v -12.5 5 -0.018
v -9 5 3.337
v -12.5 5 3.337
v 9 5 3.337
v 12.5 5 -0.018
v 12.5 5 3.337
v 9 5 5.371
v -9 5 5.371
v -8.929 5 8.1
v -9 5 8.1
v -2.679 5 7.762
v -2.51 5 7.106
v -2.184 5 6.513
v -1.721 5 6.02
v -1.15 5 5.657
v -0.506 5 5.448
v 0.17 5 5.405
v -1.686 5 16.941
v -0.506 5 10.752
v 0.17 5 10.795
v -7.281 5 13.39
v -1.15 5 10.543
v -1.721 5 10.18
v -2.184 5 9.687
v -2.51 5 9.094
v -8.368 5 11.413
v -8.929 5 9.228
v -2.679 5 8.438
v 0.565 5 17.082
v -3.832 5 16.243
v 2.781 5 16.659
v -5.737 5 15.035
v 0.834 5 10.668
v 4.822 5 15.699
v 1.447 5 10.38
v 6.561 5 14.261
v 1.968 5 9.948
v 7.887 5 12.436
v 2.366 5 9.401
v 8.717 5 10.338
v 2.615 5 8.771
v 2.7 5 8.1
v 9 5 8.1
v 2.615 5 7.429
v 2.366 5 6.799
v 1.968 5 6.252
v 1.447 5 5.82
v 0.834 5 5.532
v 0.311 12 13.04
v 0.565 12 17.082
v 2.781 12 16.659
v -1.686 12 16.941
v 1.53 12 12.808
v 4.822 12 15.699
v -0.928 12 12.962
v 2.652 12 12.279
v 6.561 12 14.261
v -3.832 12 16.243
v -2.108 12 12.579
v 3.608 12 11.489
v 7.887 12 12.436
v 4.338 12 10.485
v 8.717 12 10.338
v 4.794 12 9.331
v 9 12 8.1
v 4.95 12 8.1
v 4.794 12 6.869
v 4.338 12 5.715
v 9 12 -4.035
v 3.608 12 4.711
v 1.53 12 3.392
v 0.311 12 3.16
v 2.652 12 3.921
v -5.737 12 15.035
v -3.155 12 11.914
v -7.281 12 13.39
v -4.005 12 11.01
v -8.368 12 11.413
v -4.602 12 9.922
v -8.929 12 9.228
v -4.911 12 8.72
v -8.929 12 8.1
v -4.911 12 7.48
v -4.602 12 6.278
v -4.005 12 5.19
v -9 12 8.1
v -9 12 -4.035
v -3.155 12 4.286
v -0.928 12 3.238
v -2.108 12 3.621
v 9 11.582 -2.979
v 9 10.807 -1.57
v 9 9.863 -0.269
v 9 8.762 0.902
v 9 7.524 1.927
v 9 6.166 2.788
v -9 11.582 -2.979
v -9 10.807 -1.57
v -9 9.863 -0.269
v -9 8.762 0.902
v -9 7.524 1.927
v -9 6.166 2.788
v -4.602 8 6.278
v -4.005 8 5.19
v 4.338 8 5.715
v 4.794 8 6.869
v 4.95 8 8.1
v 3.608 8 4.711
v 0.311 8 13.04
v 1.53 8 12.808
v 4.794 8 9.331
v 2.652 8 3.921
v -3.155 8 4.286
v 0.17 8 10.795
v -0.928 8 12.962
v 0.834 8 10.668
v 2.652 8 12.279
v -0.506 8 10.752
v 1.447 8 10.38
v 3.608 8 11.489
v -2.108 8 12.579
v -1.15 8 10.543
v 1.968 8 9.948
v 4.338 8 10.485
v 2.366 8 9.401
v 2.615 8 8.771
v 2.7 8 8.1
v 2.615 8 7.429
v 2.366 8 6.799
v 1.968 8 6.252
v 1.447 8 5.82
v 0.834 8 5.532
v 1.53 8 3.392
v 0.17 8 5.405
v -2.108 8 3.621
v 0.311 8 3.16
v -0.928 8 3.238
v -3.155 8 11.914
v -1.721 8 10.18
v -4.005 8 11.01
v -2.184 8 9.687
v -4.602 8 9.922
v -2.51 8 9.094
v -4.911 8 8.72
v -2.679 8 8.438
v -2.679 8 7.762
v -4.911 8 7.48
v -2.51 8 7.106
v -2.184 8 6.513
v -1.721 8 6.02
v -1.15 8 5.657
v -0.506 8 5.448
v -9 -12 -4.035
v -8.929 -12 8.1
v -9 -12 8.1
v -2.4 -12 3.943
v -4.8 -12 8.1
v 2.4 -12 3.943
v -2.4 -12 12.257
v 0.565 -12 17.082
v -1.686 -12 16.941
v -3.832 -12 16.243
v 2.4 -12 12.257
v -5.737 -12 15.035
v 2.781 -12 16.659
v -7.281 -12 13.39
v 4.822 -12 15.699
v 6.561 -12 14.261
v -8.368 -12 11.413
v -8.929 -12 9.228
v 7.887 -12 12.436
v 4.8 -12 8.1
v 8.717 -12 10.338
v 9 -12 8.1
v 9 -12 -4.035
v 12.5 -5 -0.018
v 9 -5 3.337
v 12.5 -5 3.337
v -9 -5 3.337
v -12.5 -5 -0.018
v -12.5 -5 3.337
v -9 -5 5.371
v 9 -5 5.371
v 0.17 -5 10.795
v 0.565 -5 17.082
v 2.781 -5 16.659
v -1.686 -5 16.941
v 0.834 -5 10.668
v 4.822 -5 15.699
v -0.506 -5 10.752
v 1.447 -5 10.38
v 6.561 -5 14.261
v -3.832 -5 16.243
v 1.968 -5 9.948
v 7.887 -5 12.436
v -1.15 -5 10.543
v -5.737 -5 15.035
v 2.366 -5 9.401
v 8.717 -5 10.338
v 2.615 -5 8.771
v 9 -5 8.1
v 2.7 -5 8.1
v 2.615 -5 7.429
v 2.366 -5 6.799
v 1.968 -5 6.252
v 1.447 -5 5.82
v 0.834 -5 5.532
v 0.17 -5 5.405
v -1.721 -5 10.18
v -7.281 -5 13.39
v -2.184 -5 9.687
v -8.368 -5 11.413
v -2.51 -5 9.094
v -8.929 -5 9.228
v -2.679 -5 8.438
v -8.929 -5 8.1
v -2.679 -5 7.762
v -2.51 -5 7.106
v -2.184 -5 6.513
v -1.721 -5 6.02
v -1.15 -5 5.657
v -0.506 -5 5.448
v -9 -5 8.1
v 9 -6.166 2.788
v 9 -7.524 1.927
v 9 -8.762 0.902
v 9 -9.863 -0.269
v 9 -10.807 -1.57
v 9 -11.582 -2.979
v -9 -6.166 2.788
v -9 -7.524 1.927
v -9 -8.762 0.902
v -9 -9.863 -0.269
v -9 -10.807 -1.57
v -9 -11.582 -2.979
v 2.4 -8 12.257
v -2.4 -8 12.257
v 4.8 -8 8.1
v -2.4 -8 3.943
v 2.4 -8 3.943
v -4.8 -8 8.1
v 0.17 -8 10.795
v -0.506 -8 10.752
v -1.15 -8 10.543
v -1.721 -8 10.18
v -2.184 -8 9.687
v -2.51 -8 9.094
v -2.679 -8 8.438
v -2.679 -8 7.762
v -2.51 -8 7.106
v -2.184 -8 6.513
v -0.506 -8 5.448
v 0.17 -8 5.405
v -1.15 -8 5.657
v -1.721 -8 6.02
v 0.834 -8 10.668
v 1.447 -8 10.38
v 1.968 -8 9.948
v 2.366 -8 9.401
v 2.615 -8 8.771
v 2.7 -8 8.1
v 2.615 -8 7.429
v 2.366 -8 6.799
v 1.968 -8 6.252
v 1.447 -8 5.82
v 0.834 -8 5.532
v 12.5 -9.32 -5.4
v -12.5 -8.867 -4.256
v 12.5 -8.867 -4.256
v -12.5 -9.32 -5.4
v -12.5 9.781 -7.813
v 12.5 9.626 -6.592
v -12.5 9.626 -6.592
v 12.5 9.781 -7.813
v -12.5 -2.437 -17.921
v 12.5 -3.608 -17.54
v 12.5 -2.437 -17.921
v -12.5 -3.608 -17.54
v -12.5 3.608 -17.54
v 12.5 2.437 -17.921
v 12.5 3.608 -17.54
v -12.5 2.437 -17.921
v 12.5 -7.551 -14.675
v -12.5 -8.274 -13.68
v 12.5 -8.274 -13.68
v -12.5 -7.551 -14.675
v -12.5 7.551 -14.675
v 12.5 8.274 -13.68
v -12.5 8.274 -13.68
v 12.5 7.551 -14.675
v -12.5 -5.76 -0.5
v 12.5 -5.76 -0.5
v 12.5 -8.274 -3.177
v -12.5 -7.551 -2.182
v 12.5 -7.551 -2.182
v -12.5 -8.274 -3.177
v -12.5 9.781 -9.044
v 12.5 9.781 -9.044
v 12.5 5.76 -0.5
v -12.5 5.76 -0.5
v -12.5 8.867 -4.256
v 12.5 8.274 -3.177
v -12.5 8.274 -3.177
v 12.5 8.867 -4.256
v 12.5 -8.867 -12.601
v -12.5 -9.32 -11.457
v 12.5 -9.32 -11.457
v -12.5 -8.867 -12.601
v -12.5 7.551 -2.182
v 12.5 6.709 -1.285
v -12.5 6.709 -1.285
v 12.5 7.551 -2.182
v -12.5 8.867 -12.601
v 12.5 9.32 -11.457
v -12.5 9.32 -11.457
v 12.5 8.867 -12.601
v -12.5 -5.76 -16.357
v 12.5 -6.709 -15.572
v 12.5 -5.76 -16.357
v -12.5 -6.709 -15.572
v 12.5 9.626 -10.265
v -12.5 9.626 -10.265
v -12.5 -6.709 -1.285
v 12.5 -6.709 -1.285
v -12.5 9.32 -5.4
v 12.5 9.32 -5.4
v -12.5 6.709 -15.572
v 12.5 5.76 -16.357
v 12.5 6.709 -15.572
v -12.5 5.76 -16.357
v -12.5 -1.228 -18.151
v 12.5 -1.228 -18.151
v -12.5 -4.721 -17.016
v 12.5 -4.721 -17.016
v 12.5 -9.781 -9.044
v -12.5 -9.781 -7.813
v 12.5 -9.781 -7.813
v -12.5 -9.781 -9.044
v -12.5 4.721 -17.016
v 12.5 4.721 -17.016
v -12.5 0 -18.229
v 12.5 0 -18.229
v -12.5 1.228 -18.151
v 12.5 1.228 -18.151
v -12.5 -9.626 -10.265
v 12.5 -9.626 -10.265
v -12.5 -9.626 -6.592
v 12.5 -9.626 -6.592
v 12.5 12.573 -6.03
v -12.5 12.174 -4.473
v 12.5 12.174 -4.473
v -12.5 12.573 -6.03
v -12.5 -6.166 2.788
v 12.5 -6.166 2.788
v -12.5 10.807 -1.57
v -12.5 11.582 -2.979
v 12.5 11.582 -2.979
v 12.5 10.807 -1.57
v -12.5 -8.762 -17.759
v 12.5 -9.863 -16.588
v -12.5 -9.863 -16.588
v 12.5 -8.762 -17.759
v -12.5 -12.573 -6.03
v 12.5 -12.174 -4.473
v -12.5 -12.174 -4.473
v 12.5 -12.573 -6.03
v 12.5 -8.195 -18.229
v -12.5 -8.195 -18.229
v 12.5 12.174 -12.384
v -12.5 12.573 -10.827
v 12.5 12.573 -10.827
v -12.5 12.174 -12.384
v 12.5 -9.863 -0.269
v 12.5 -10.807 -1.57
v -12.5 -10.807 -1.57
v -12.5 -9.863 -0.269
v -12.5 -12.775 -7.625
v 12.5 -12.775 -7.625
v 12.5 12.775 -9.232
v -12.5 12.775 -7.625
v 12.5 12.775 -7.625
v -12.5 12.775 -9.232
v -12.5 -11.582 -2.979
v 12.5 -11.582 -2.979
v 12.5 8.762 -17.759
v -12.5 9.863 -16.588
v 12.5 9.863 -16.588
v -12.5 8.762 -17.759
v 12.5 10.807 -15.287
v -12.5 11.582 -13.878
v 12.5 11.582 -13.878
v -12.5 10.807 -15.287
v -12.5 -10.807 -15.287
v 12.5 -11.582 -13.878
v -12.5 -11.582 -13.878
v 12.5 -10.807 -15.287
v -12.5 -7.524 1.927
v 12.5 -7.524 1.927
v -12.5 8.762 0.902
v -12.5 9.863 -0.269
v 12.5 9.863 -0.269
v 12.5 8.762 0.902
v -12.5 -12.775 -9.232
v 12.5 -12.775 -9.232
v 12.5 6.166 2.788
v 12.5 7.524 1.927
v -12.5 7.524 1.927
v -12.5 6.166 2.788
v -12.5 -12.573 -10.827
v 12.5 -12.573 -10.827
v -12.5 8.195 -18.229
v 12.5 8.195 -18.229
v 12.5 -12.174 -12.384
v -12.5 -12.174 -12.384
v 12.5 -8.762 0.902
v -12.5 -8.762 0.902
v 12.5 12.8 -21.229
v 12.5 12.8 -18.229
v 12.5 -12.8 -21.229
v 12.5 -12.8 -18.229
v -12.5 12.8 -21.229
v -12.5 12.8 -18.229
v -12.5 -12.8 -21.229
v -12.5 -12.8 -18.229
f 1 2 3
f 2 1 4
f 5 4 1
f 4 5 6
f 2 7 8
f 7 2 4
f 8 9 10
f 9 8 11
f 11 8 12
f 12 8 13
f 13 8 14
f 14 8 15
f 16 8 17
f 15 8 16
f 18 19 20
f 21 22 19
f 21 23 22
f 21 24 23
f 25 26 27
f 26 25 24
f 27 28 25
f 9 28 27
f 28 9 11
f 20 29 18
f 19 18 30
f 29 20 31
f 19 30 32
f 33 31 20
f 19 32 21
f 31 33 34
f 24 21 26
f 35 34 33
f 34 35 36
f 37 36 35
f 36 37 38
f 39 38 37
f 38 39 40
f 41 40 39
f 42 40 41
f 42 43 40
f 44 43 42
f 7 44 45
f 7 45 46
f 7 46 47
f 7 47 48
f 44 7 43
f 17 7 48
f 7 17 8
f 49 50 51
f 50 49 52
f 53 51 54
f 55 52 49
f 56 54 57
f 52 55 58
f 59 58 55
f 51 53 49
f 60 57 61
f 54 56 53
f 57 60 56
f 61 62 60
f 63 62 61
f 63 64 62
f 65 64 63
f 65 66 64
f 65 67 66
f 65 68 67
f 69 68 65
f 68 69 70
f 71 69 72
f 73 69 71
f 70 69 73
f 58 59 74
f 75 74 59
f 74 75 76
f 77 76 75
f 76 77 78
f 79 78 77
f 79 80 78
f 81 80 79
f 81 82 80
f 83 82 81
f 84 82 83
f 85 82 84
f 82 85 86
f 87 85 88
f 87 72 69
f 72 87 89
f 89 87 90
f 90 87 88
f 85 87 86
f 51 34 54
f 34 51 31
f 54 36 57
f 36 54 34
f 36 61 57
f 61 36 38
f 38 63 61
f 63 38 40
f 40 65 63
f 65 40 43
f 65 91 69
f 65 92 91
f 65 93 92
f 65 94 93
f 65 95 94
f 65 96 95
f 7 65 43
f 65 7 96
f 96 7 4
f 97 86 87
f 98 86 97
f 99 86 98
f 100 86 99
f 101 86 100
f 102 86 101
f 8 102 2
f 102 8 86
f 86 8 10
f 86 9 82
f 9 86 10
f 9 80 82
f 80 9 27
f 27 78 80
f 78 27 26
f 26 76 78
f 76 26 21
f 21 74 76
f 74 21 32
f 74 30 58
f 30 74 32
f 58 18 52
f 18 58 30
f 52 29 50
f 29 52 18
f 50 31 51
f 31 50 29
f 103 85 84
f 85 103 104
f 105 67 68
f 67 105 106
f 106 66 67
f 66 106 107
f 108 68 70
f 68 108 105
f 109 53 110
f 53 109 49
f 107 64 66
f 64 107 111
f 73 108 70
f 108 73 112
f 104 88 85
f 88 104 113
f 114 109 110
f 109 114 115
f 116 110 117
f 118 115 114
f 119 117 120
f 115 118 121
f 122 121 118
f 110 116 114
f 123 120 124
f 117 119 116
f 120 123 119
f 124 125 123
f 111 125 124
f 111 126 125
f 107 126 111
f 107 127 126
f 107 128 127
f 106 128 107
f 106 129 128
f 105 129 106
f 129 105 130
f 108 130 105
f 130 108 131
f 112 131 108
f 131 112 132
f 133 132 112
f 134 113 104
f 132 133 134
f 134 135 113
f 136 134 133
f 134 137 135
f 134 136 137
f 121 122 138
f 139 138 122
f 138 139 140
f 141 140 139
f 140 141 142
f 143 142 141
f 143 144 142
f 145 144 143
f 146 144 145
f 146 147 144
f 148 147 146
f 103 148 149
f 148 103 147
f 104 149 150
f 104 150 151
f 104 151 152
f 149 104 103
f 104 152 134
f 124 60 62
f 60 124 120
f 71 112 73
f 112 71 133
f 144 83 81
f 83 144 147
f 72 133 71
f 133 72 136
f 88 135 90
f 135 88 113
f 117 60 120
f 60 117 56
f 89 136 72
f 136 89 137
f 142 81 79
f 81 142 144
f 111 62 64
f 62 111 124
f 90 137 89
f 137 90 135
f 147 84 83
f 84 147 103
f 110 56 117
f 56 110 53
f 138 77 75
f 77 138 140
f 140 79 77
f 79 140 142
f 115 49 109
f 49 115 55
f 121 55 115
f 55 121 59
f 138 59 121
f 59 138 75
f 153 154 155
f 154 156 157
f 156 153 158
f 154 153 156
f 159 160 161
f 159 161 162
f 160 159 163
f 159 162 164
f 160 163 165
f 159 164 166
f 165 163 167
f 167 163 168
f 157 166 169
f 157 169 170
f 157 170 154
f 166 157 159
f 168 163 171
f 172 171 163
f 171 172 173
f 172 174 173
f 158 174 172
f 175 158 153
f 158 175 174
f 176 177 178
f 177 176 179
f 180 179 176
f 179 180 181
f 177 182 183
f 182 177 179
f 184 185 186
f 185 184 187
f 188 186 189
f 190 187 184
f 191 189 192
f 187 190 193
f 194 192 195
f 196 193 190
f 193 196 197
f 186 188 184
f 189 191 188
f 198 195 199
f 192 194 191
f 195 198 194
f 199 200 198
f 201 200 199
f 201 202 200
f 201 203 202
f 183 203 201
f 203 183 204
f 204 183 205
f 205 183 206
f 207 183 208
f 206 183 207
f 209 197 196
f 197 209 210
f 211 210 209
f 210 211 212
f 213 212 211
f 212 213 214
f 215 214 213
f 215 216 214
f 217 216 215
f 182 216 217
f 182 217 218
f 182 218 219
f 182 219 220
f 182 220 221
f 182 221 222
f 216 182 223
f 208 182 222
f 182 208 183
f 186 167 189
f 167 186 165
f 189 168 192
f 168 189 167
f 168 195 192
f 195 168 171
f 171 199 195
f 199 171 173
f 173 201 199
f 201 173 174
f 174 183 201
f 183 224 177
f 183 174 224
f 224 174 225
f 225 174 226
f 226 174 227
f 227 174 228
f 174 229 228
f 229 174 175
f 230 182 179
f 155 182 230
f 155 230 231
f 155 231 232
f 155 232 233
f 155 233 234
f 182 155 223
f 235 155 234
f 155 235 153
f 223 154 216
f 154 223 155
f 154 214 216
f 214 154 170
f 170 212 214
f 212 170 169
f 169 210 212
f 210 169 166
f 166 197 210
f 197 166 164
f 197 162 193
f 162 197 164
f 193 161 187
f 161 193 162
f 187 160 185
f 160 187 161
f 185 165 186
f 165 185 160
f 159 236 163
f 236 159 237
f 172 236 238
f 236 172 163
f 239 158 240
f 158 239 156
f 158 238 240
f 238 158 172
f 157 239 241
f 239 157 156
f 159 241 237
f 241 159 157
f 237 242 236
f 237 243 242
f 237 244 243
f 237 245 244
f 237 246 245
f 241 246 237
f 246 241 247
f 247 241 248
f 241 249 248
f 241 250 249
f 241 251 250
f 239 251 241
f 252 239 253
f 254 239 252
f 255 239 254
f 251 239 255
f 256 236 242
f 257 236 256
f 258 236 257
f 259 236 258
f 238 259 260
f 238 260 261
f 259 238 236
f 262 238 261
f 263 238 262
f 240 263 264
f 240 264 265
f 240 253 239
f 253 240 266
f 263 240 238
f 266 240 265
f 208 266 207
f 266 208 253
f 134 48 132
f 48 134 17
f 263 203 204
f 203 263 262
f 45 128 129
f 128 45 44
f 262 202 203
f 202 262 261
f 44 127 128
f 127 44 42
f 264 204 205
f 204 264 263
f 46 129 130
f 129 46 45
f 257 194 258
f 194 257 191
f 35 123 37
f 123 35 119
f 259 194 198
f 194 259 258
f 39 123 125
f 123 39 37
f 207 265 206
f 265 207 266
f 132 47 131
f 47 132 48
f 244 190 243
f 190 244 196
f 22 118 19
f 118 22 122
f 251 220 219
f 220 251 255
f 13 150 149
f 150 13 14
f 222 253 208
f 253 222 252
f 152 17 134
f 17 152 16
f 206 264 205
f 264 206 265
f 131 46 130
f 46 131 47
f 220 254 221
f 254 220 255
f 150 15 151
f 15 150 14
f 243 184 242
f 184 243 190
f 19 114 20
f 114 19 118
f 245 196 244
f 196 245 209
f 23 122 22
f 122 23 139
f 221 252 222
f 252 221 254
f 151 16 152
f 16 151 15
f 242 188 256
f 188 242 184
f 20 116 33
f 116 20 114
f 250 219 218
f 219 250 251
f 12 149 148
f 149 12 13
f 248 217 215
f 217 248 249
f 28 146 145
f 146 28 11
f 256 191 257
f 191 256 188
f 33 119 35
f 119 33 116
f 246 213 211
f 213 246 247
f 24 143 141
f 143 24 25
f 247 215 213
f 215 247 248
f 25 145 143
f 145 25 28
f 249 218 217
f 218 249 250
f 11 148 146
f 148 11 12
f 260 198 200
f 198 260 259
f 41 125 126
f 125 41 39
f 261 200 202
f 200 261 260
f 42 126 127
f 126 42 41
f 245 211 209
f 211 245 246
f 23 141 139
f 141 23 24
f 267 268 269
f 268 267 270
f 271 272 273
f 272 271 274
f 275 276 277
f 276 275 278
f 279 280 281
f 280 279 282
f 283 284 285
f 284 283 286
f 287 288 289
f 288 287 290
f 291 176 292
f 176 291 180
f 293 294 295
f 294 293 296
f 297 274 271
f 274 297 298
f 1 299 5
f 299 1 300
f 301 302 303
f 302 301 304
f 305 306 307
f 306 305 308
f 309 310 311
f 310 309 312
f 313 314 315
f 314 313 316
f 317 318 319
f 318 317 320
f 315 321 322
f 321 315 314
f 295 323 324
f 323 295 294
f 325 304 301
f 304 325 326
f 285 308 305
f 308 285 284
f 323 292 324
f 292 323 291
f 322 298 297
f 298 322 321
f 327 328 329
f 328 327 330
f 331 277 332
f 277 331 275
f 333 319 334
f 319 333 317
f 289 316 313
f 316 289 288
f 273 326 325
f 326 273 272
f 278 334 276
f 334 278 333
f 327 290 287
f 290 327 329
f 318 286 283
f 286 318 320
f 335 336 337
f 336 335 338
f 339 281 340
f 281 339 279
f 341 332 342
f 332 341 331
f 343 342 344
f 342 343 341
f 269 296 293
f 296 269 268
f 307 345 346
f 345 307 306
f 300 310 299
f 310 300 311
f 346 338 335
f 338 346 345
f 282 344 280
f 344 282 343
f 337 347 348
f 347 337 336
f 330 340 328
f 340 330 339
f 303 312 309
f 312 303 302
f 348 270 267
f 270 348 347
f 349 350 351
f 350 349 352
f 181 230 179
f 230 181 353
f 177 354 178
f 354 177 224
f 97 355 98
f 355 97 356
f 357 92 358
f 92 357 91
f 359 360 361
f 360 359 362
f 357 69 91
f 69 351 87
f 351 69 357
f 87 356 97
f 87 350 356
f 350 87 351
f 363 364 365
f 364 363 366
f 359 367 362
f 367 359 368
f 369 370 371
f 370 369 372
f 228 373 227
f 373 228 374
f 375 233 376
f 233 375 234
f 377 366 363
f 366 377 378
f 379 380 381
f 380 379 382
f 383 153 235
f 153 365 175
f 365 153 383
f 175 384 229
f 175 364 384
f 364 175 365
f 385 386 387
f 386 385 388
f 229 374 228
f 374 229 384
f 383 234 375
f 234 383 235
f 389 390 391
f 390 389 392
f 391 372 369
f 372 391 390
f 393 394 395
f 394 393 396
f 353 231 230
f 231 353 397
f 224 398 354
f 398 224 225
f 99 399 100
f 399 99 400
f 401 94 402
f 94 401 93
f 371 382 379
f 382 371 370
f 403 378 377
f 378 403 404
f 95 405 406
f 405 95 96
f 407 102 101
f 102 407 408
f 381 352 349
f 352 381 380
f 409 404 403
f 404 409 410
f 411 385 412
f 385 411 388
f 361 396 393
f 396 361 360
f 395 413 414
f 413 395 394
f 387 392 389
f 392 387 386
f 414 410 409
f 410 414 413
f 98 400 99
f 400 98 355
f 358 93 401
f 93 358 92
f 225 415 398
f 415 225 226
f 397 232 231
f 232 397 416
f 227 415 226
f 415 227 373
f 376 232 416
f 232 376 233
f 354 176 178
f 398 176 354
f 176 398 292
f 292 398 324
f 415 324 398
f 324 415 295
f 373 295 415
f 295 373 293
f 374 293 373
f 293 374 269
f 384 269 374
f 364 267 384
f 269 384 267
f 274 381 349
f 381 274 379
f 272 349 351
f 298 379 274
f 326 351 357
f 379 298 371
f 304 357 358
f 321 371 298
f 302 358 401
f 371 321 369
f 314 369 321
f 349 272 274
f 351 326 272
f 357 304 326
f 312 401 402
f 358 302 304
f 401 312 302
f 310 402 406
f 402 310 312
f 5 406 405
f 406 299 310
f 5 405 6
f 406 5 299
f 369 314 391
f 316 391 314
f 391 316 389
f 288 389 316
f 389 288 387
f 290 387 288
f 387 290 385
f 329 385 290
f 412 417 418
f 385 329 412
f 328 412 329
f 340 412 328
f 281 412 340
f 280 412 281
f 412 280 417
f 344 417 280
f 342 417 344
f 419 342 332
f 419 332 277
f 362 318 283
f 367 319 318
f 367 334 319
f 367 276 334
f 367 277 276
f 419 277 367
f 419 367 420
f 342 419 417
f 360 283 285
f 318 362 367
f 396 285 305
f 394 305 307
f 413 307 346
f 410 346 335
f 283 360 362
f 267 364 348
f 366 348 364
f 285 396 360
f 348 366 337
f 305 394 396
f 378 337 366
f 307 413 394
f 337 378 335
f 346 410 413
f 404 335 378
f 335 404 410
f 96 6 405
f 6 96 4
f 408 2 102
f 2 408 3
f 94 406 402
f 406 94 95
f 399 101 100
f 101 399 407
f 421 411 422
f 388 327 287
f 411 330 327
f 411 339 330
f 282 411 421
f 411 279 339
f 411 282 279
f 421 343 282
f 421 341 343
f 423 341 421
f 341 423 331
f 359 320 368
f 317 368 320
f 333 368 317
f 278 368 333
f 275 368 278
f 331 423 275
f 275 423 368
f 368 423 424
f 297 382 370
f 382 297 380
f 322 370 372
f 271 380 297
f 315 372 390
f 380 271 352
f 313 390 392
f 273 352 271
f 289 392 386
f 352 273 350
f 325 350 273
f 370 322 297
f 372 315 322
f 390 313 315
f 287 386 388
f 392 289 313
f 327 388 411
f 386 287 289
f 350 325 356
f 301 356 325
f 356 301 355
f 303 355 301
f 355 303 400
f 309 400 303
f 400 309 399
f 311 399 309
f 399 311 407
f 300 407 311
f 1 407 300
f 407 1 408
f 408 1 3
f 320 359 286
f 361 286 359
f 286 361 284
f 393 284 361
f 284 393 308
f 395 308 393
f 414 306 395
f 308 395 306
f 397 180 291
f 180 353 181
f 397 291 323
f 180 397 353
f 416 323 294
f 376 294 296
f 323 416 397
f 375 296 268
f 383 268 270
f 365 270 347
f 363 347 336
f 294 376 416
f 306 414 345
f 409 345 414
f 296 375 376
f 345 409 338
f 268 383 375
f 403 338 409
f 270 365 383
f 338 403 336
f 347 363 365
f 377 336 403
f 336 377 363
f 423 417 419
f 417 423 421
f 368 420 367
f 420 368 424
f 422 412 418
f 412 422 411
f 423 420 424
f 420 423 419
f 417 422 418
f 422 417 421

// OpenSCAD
// file: rj260_linear_bearing.scad
// Copyright 2017 Pavel Penev
// https://www.thingiverse.com/pavpen/about
//
// You can use this file under Attribution-ShareAlike 4.0 International
// (CC BY-SA 4.0).
//
// If you need to use it under another license, send me a message.

// Parameters for J260 Igus linear bearings
// <http://www.igus.com/wpck/3660/drylin_r_rj260um_02>:
outer_r = 19.2 / 2 + 0.2;
inner_r = 12.15 / 2;

// Length of the part actually intended to contact the axle:
sleeve_length = 25 - 0.2;
chamfer_length = 1.5;

// Total length of the bearing:
length = sleeve_length + 2 * chamfer_length;

outer_chamfer_angle = 15;
inner_chamfer_angle = 15;

fn = 100;


// Export functions:
function pro_pavpen_rj260_linear_bearing_outer_r() = outer_r;
function pro_pavpen_rj260_linear_bearing_inner_r() = inner_r;
function pro_pavpen_rj260_linear_bearing_sleeve_length() = sleeve_length;
function pro_pavpen_rj260_linear_bearing_length() = length;

// Demo:
pro_pavpen_rj260_linear_bearing();


module pro_pavpen_rj260_linear_bearing()
{
    difference()
    {
        union()
        {
            translate([0, 0, chamfer_length])
            cylinder(r = outer_r, h = sleeve_length, $fn = fn);
            
            // Top outer chamfer:
            translate([0, 0, chamfer_length + sleeve_length])
            cylinder(
                r1 = outer_r,
                r2 = outer_r - chamfer_length * tan(outer_chamfer_angle),
                h = chamfer_length,
                $fn = fn);
            
            // Bottom outer chamfer:
            cylinder(
                r1 = outer_r - chamfer_length * tan(outer_chamfer_angle),
                r2 = outer_r,
                h = chamfer_length,
                $fn = fn);
        }
        
        translate([0, 0, -1])
        cylinder(r = inner_r, h = length + 2, $fn = fn);
        
        // Top inner chamfer:
        translate([0, 0, chamfer_length + sleeve_length])
        cylinder(
            r1 = inner_r,
            r2 = inner_r + (chamfer_length + 1) * tan(inner_chamfer_angle),
            h = chamfer_length + 1,
            $fn = fn);
        
        // Bottom inner chamfer:
        translate([0, 0, -1])
        cylinder(
            r1 = inner_r + (chamfer_length + 1) * tan(inner_chamfer_angle),
            r2 = inner_r,
            h = chamfer_length + 1,
            $fn = fn);
    }
}
// main file
// Copyright 2017 Pavel Penev
// https://www.thingiverse.com/pavpen/about
//
// You can use this file under Attribution-ShareAlike 4.0 International
// (CC BY-SA 4.0).
//
// If you need to use it under another license, send me a message.

use <rj260_linear_bearing.scad>

wall_thickness = 3;
tensioner_flap_r = 18 / 2;
tensioner_travel_distance = 10;
tensioner_bolt_r = 5 /2 + 0.2;
tensioner_bolt_head_r = 9.5 / 2 + 0.2;
tensioner_bolt_head_bed_depth = 4;
tensioner_bolt_flap_r = tensioner_flap_r;
tensioner_nut_side_count = 6;
tensioner_nut_outer_r = 9 / 2 + 0.3;
tensioner_nut_bed_depth = 4;
tensioner_nut_flap_r = tensioner_flap_r;
tensioner_body_length = 25;
tensioner_body_fn = 50;
tensioner_fn = 25;

// Export functions:
function pro_pavpen_linear_bearing_bracket_wall_thickness() =
    wall_thickness;

function pro_pavpen_linear_bearing_bracket_tensioner_body_length() =
    tensioner_body_length;



function pro_pavpen_linear_bearing_bracket_z_offset_to_center(
    bearing_outer_r = pro_pavpen_rj260_linear_bearing_outer_r()
) =
    sqrt(pow(bearing_outer_r, 2) - pow(tensioner_travel_distance / 2, 2));


// Demo:

//pro_pavpen_linear_bearing_bracket_demo_nut_flap();
pro_pavpen_linear_bearing_bracket_printable();


module pro_pavpen_linear_bearing_bracket_printable(
    bearing_outer_r = pro_pavpen_rj260_linear_bearing_outer_r()
)
{
    rotate([180, 0, 0])
    union()
    {
        pro_pavpen_linear_bearing_bracket();
        
        // Top plate:
        translate([
            -tensioner_body_length / 2,
            -bearing_outer_r - wall_thickness,
            bearing_outer_r +
                pro_pavpen_linear_bearing_bracket_z_offset_to_center()])
        cube([
            tensioner_body_length,
            2 * bearing_outer_r + 2 * wall_thickness,
            wall_thickness]);
    }
}

module pro_pavpen_linear_bearing_bracket_demo_nut_flap()
{
    rotate([-90, 0, 0])
    difference()
    {
        pro_pavpen_linear_bearing_bracket_tensioner_nut_flap();
        
        cylinder(
                        r = tensioner_bolt_r,
                        h = 2 * wall_thickness +
                            tensioner_bolt_head_bed_depth +
                            tensioner_nut_bed_depth +
                            tensioner_travel_distance + 2,
                        center = true,
                        $fn = tensioner_fn);

        translate([
            -tensioner_nut_flap_r - 1,
            tensioner_nut_outer_r + 3,
            -1])
        cube([
            2 * tensioner_nut_flap_r + 2,
            2 * tensioner_nut_flap_r,
            wall_thickness + tensioner_nut_bed_depth + 2]);
    }
}


module pro_pavpen_linear_bearing_bracket(
    bearing_outer_r = pro_pavpen_rj260_linear_bearing_outer_r(),
    wall_thickness = wall_thickness
)
{
    module tensioner_flaps()
    {
        translate([0, 0, -3 * tensioner_bolt_r])
        rotate([90, 0, 0])
        difference()
        {
            union()
            {
                translate([0, 0, tensioner_travel_distance / 2])
                pro_pavpen_linear_bearing_bracket_tensioner_bolt_flap(
                    wall_thickness = wall_thickness,
                    tensioner_travel_distance = tensioner_travel_distance,
                    tensioner_bolt_head_r = tensioner_bolt_head_r,
                    tensioner_bolt_head_bed_depth = tensioner_bolt_head_bed_depth,
                    tensioner_bolt_flap_r = tensioner_bolt_flap_r,
                    tensioner_fn = tensioner_fn);
                
                translate([
                    0,
                    0,
                    -wall_thickness - tensioner_nut_bed_depth - tensioner_travel_distance / 2])
                pro_pavpen_linear_bearing_bracket_tensioner_nut_flap(
                    wall_thickness = wall_thickness,
                    tensioner_travel_distance = tensioner_travel_distance,
                    tensioner_nut_side_count = tensioner_nut_side_count,
                    tensioner_nut_outer_r = tensioner_nut_outer_r,
                    tensioner_nut_bed_depth = tensioner_nut_bed_depth,
                    tensioner_nut_flap_r = tensioner_nut_flap_r,
                    tensioner_fn = tensioner_fn);
            }

            cylinder(
                r = tensioner_bolt_r,
                h = 2 * wall_thickness +
                    tensioner_bolt_head_bed_depth +
                    tensioner_nut_bed_depth +
                    tensioner_travel_distance + 2,
                center = true,
                $fn = tensioner_fn);
        }
    }

    module tensioner_body()
    {
        translate([
            -tensioner_body_length / 2,
            0,
            sqrt(pow(bearing_outer_r, 2) -
                pow(tensioner_travel_distance / 2, 2))])
        rotate([0, 90, 0])
        pro_pavpen_linear_bearing_bracket_tensioner_body(
            bearing_outer_r = bearing_outer_r,
            wall_thickness = wall_thickness,
            tensioner_travel_distance = tensioner_travel_distance,
            tensioner_body_length = tensioner_body_length,
            tensioner_body_fn = tensioner_body_fn
        );
    }
    
    module tensioner_body_hole()
    {
        translate([
            -tensioner_body_length / 2,
            0,
            pro_pavpen_linear_bearing_bracket_z_offset_to_center()])
        rotate([0, 90, 0])
        pro_pavpen_linear_bearing_bracket_tensioner_body_hole(
            bearing_outer_r = bearing_outer_r,
            wall_thickness = wall_thickness,
            tensioner_travel_distance = tensioner_travel_distance,
            tensioner_body_length = tensioner_body_length,
            tensioner_body_fn = tensioner_body_fn
        );
    }

    difference()
    {
        union()
        {
            tensioner_flaps();
            tensioner_body();
        }

        tensioner_body_hole();
    }
}

module pro_pavpen_linear_bearing_bracket_tensioner_body(
    bearing_outer_r = pro_pavpen_rj260_linear_bearing_outer_r(),
    wall_thickness = wall_thickness,
    tensioner_travel_distance = tensioner_travel_distance,
    tensioner_body_length = tensioner_body_length,
    tensioner_body_fn = tensioner_body_fn
)
{
    difference()
    {
        cylinder(
            r = bearing_outer_r + wall_thickness,
            h = tensioner_body_length,
            $fn = tensioner_body_fn);

        pro_pavpen_linear_bearing_bracket_tensioner_body_hole(
            bearing_outer_r = bearing_outer_r,
            wall_thickness = wall_thickness,
            tensioner_travel_distance = tensioner_travel_distance,
            tensioner_body_length = tensioner_body_length,
            tensioner_body_fn = tensioner_body_fn
        );
    }
}

module pro_pavpen_linear_bearing_bracket_tensioner_body_hole(
    bearing_outer_r = pro_pavpen_rj260_linear_bearing_outer_r(),
    wall_thickness = wall_thickness,
    tensioner_travel_distance = tensioner_travel_distance,
    tensioner_body_length = tensioner_body_length,
    tensioner_body_fn = tensioner_body_fn
)
{
    union()
    {
        translate([0, 0, -1])
        cylinder(
            r = bearing_outer_r,
            h = tensioner_body_length + 2,
            $fn = tensioner_body_fn);

        translate([
            0,
            -tensioner_travel_distance / 2,
            -1])
        cube([
            bearing_outer_r + wall_thickness + 1,
            tensioner_travel_distance,
            tensioner_body_length + 2]);
    }
}

module pro_pavpen_linear_bearing_bracket_tensioner_bolt_flap(
    wall_thickness = wall_thickness,
    tensioner_travel_distance = tensioner_travel_distance,
    tensioner_bolt_head_r = tensioner_bolt_head_r,
    tensioner_bolt_head_bed_depth = tensioner_bolt_head_bed_depth,
    tensioner_bolt_flap_r = tensioner_bolt_flap_r,
    tensioner_fn = tensioner_fn
)
{
    difference()
    {
        linear_extrude(wall_thickness + tensioner_bolt_head_bed_depth)
        {
            circle(r = tensioner_bolt_flap_r, $fn = tensioner_fn);

            translate([-tensioner_bolt_flap_r, 0, 0])
            square(2 * tensioner_bolt_flap_r);
        }

        translate([0, 0, wall_thickness])
        cylinder(
            r = tensioner_bolt_head_r,
            h = tensioner_bolt_head_bed_depth + 1,
            $fn = tensioner_fn);
    }
}

module pro_pavpen_linear_bearing_bracket_tensioner_nut_flap(
    wall_thickness = wall_thickness,
    tensioner_travel_distance = tensioner_travel_distance,
    tensioner_nut_side_count = tensioner_nut_side_count,
    tensioner_nut_outer_r = tensioner_nut_outer_r,
    tensioner_nut_bed_depth = tensioner_nut_bed_depth,
    tensioner_nut_flap_r = tensioner_nut_flap_r,
    tensioner_fn = tensioner_fn
)
{
    difference()
    {
        linear_extrude(wall_thickness + tensioner_nut_bed_depth)
        {
            circle(r = tensioner_nut_flap_r, $fn = tensioner_fn);

            translate([-tensioner_nut_flap_r, 0, 0])
            square(2 * tensioner_nut_flap_r);
        }

        translate([0, 0, -1])
        cylinder(
            r = tensioner_nut_outer_r,
            h = tensioner_nut_bed_depth + 1,
            $fn = tensioner_nut_side_count);
    }
}
